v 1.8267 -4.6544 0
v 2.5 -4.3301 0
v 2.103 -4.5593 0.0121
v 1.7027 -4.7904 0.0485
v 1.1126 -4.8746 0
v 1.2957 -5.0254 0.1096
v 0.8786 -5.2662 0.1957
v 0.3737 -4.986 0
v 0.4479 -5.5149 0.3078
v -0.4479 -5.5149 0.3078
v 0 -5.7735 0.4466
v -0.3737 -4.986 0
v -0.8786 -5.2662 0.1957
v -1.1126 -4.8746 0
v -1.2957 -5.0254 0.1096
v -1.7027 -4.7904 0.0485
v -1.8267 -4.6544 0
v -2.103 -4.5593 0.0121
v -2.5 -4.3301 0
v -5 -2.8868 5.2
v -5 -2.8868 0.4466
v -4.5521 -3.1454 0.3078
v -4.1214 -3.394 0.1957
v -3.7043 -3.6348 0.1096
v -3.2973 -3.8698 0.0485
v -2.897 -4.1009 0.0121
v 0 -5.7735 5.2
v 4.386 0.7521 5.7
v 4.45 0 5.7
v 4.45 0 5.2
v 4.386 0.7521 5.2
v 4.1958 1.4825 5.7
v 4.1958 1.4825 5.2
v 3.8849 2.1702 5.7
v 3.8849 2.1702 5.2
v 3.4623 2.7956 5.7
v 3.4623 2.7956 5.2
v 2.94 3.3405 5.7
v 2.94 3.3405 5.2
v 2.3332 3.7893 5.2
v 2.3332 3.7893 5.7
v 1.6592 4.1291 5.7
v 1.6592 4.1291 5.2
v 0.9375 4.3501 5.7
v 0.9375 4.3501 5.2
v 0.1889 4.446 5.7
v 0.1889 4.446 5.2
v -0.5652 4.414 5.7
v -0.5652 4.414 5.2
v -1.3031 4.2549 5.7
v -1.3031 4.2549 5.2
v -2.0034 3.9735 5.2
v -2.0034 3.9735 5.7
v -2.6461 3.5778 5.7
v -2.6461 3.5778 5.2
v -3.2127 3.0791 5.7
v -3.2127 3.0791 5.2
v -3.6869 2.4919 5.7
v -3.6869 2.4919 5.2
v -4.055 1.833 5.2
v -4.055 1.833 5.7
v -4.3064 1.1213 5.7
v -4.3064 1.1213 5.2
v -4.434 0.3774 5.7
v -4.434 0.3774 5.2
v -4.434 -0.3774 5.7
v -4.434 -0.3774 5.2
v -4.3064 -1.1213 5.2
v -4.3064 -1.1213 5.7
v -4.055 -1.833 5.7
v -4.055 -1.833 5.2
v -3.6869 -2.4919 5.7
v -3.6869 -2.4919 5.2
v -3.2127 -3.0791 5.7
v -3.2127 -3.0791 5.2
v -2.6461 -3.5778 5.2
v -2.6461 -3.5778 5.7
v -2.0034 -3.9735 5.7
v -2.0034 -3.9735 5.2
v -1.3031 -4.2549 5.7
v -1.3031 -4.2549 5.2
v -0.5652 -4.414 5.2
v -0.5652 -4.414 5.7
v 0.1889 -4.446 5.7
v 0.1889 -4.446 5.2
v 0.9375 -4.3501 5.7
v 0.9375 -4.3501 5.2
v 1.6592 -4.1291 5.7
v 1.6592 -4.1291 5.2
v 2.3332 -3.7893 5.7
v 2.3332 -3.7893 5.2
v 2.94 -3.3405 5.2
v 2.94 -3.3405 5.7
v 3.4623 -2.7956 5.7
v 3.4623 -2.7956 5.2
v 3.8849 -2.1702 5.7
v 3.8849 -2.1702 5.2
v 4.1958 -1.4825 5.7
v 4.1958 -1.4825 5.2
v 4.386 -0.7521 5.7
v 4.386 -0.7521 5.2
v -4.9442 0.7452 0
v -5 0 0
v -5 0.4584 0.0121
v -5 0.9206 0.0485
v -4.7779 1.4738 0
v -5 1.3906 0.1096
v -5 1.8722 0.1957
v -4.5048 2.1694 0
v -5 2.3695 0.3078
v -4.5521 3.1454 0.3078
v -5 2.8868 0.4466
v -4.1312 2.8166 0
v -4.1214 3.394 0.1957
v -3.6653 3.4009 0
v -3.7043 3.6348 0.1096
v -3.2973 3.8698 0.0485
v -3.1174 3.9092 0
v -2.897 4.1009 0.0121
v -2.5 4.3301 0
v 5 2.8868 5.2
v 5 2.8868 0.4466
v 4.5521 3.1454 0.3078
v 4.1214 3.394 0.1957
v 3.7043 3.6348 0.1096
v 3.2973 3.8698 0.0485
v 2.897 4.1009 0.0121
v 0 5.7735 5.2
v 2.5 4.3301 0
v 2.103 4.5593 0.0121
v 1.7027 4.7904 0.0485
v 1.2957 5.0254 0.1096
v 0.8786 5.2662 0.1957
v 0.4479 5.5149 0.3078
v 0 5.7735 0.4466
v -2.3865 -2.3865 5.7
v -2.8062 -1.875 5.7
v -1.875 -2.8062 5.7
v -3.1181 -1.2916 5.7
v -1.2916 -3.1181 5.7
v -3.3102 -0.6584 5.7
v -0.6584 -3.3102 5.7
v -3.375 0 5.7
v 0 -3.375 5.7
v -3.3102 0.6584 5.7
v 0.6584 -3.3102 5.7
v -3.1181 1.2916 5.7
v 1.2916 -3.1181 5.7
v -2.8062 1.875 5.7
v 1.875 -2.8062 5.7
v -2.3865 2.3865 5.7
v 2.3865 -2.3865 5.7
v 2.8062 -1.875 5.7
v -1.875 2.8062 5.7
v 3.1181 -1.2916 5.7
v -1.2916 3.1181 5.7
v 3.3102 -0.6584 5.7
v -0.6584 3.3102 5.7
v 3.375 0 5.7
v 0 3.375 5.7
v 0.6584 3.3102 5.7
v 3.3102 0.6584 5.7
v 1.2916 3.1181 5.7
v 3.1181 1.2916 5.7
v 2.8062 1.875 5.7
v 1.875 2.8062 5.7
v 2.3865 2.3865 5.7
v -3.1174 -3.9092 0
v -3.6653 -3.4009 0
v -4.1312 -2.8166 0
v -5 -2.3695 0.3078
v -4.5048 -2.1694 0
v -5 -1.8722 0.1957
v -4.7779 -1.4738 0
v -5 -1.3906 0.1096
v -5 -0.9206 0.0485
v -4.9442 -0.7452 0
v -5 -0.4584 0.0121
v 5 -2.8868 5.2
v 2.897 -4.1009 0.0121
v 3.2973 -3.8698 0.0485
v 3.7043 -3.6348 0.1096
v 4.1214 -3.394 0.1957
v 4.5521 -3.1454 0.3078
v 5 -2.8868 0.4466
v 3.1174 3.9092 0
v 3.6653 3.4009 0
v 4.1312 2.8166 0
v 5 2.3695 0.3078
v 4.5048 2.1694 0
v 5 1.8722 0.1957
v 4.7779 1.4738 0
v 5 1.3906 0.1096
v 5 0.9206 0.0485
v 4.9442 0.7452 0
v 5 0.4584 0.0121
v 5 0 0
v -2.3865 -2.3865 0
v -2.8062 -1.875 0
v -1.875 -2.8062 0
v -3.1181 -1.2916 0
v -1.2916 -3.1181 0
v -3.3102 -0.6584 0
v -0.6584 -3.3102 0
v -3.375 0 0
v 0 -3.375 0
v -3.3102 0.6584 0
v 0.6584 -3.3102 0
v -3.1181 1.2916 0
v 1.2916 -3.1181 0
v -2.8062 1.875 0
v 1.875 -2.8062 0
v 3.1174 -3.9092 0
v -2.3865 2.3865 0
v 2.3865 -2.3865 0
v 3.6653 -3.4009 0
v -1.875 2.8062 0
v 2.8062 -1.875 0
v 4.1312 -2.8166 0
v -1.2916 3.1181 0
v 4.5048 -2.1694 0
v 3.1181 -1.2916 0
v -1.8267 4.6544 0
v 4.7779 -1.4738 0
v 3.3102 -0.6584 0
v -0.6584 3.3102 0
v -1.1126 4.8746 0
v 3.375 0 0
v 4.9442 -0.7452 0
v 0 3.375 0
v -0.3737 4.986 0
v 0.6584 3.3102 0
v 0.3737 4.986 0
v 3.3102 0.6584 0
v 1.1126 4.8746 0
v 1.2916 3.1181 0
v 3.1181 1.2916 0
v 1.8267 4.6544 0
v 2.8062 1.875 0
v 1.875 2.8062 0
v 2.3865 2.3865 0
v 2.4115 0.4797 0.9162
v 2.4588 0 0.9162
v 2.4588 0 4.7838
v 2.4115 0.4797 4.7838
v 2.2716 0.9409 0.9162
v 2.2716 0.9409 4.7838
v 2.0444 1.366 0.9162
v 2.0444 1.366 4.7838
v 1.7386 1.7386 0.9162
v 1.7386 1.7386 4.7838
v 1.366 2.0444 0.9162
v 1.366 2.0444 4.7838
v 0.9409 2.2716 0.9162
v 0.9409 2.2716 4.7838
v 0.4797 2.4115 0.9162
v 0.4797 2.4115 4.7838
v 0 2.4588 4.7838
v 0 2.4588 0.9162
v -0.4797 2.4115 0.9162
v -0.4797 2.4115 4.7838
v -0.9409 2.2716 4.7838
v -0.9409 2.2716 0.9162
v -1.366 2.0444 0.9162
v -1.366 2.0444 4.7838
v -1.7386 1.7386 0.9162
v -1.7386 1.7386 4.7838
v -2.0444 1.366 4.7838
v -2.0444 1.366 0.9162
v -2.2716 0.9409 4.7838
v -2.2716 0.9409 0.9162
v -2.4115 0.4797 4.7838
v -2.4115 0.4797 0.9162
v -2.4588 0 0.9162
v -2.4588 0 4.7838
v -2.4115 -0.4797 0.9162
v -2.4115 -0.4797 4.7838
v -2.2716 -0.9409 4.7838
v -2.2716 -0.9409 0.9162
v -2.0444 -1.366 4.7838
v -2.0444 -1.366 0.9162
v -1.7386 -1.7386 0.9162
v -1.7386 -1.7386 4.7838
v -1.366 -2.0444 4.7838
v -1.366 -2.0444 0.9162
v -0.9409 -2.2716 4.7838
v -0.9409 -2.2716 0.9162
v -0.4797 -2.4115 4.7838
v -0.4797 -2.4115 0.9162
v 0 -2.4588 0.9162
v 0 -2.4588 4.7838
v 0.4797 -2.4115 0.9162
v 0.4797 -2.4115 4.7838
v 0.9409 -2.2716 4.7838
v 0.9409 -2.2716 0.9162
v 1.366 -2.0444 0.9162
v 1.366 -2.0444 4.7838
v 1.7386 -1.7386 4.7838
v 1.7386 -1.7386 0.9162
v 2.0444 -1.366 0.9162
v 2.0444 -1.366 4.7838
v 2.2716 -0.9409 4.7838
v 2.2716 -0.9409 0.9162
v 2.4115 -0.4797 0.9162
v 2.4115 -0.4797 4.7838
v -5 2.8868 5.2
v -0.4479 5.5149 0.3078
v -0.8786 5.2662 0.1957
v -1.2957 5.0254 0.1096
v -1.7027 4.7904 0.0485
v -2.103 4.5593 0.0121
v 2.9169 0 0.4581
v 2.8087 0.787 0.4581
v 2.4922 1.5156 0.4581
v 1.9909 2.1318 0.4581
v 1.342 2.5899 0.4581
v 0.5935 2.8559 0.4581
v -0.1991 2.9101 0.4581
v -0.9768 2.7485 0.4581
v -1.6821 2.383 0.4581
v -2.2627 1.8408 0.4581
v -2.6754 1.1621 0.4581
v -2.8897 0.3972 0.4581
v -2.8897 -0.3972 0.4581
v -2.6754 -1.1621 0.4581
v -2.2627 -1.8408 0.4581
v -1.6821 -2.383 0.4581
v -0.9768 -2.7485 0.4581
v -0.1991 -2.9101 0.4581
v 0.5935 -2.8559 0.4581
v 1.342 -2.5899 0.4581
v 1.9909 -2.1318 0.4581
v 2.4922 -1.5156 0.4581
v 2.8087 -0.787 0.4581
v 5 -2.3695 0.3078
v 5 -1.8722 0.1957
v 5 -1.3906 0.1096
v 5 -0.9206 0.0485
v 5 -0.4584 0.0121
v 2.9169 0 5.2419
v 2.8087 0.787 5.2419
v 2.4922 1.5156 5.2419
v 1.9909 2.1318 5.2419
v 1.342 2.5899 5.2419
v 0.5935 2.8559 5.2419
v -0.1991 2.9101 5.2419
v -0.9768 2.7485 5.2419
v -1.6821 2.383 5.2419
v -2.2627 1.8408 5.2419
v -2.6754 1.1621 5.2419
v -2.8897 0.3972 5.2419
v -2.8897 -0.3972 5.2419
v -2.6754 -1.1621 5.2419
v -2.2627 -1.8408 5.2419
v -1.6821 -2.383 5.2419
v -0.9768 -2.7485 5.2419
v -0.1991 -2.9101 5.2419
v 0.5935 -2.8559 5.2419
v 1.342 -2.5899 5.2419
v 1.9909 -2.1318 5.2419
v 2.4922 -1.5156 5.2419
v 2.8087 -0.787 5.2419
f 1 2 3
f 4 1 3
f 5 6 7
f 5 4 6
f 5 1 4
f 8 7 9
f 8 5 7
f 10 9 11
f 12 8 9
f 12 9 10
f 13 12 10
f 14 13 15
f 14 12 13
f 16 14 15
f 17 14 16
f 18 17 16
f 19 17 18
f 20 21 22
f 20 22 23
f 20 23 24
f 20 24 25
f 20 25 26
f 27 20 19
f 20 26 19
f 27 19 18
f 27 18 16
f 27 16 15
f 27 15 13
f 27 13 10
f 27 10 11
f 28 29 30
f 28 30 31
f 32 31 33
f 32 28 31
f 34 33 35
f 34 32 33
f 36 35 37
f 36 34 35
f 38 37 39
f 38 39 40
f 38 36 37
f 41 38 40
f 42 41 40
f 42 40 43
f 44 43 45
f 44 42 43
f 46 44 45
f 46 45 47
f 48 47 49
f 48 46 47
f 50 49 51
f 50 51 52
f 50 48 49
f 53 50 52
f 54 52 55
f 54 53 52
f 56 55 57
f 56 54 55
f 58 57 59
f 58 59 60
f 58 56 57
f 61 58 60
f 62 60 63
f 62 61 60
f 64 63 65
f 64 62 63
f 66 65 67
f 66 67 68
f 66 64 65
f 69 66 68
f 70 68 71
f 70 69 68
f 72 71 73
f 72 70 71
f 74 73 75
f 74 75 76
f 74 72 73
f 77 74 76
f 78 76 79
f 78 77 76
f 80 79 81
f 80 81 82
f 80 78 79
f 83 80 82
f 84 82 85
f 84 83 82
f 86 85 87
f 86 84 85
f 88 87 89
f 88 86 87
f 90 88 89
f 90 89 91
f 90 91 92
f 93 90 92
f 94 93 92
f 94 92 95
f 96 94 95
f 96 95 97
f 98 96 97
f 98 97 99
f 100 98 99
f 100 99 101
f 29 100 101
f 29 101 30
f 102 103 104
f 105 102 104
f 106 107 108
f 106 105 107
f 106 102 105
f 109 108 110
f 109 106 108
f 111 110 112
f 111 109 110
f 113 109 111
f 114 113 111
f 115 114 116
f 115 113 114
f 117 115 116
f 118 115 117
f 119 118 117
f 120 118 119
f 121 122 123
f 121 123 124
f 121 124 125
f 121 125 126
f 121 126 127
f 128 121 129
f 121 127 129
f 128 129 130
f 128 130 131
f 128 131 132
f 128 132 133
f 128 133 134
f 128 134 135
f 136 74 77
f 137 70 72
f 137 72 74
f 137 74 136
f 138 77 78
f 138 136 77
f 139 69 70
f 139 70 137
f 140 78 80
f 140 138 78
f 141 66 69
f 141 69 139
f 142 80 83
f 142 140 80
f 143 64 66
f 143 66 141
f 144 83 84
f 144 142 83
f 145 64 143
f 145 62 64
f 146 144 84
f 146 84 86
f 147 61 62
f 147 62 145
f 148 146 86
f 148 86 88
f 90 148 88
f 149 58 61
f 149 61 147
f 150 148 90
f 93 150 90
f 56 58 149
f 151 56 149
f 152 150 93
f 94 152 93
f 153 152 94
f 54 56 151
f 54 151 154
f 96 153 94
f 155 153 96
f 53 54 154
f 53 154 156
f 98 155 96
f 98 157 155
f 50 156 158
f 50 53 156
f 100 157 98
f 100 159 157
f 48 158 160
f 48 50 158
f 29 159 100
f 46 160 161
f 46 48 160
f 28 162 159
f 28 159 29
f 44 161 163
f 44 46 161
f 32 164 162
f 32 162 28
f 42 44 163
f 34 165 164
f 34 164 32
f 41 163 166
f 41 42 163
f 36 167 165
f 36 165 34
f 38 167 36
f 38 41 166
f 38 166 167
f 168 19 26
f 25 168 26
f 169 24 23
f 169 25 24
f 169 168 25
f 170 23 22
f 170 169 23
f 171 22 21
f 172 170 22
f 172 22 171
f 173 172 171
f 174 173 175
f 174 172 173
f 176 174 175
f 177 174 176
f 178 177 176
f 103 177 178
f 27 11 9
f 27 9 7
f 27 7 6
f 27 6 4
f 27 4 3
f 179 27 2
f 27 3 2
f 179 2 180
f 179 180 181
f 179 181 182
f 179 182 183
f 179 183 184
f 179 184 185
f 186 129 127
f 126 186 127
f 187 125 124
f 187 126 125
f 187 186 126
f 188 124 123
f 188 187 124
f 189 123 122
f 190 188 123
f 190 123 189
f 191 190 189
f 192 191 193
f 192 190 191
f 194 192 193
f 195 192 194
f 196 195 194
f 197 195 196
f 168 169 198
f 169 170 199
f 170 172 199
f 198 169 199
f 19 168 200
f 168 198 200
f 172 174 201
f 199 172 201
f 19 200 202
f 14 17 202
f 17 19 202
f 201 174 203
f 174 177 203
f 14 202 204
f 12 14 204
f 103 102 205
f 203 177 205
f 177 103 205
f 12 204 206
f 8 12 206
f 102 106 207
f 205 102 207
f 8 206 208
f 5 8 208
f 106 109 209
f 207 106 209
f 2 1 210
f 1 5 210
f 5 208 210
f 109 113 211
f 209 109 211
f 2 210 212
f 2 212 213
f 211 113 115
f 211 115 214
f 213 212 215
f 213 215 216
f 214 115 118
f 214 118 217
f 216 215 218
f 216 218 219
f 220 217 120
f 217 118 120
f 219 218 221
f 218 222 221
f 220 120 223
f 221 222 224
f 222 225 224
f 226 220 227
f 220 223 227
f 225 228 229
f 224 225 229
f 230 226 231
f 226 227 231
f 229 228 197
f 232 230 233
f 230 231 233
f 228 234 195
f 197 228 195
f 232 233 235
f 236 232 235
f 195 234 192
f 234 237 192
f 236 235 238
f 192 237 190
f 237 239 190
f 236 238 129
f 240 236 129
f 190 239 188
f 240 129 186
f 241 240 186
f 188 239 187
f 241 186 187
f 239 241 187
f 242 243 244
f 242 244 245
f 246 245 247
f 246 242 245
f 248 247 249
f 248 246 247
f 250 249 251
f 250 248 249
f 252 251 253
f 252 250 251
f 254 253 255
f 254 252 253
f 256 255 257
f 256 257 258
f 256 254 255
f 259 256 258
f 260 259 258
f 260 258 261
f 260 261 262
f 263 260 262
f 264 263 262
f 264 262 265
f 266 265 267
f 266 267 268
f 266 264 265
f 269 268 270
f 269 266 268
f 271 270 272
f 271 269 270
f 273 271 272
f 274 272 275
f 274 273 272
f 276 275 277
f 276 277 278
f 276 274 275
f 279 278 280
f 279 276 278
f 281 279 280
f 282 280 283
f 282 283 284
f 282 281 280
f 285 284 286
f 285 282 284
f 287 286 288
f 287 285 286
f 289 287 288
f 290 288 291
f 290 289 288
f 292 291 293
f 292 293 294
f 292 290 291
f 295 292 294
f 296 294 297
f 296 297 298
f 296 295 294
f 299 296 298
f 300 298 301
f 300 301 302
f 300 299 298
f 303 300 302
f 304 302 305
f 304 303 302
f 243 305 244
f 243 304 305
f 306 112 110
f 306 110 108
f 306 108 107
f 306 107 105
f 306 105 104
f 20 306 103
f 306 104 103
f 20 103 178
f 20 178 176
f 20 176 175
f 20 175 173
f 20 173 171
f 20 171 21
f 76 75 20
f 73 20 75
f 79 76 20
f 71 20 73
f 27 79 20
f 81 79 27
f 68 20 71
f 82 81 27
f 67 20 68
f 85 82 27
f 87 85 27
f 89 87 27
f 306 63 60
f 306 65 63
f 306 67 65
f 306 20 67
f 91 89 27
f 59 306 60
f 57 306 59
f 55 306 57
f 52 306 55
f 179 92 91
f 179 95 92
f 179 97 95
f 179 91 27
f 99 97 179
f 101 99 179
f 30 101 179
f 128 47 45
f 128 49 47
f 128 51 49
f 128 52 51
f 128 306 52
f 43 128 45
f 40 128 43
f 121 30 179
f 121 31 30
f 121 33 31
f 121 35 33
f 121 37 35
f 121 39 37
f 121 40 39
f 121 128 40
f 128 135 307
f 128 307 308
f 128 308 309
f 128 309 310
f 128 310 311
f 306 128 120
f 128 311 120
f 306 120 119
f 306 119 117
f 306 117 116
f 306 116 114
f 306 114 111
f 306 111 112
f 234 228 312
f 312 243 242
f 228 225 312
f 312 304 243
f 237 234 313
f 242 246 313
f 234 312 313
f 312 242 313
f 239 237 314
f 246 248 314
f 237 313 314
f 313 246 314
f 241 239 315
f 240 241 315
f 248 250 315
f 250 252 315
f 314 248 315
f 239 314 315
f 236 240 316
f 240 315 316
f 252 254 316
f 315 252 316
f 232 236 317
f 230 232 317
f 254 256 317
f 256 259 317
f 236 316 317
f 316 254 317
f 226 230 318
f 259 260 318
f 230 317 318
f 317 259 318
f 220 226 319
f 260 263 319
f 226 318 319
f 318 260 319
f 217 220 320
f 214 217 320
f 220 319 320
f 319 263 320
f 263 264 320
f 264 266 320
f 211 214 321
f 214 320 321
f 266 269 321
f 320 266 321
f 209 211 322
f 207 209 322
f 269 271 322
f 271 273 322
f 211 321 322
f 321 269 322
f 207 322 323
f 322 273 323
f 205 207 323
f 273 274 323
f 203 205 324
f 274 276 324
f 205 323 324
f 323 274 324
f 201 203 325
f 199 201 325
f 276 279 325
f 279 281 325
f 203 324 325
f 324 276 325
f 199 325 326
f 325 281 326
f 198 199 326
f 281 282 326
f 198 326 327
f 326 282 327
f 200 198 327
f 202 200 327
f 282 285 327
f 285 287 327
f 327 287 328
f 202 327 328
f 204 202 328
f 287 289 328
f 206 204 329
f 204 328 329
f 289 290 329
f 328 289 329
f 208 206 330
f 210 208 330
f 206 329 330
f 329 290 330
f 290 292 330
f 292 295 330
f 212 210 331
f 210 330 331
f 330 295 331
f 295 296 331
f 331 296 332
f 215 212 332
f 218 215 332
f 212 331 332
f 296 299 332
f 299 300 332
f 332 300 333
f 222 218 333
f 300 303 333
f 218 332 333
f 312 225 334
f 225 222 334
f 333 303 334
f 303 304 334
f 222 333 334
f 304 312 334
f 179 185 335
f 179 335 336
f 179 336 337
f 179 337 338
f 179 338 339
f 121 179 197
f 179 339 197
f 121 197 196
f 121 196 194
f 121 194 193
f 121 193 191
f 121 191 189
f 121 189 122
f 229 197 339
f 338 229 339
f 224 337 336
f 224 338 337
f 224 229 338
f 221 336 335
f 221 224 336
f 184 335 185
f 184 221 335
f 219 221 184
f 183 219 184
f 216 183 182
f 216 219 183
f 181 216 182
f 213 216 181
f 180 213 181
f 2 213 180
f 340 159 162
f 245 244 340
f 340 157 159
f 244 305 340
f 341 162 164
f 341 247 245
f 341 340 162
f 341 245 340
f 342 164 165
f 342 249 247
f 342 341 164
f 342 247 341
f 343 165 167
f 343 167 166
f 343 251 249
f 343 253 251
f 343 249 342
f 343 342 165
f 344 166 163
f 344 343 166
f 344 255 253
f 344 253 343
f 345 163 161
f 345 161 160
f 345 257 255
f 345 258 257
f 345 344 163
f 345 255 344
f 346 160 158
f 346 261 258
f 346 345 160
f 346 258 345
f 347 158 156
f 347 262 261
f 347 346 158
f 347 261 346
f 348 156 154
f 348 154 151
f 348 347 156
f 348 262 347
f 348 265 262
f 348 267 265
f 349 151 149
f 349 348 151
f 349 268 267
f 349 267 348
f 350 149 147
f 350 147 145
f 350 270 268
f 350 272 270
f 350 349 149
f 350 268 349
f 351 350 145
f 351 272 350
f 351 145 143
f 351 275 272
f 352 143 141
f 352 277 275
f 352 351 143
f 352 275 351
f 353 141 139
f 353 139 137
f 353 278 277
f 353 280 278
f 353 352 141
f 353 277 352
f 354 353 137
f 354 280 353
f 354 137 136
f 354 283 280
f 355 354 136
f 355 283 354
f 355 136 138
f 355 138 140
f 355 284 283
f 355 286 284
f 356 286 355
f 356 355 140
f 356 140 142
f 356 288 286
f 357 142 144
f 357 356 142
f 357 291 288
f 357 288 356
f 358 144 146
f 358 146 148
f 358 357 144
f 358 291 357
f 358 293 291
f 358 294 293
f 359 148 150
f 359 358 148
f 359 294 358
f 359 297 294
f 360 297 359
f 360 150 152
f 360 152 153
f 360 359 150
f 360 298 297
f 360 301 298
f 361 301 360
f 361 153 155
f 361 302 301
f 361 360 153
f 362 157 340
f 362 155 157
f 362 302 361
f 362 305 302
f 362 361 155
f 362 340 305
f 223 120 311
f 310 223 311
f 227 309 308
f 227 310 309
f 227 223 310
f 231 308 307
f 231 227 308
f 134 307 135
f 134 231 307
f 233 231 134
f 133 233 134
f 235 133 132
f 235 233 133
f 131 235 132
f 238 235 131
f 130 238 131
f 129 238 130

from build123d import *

# Parameters (mm, degrees)
SKETCH_1_R          = 2.45875
EXTRUDE_640_DEPTH   = 5.7
SKETCH_2_OUTSIDE_W  = 51.738
SKETCH_2_OUTSIDE_H  = 53.286
SKETCH_2_OUTSIDE_R  = 5
CUT_EXTRUDE_1_DEPTH = 10.530127666
CUT_EXTRUDE_1_DRAFT = -60
CHAMFER_1_SIZE      = 0.91625
SKETCH_3_OUTSIDE_W  = 51.738
SKETCH_3_OUTSIDE_H  = 53.286
SKETCH_3_OUTSIDE_R  = 5
CUT_EXTRUDE_2_DEPTH = 10.530127666
CUT_EXTRUDE_2_DRAFT = -60
SKETCH_4_R          = 8.9
SKETCH_4_R_2        = 4.45
CUT_EXTRUDE_3_DEPTH = 0.5


with BuildPart() as part:
    # 草图1 → Extrude 640 (new body)
    with BuildSketch(Plane.XY):
        Polygon((0, 5.773502692), (-5, 2.886751346), (-5, -2.886751346), (0, -5.773502692), (5, -2.886751346), (5, 2.886751346), align=None)
        Circle(SKETCH_1_R, mode=Mode.SUBTRACT)
    extrude(amount=EXTRUDE_640_DEPTH)


with BuildPart() as cut_extrude_1_tool:
    # 草图2 outside → 切除-拉伸1 (with draft: the straight prism first)
    with BuildSketch(Plane(origin=(0, 0, 0), x_dir=(-1, 0, 0), z_dir=(0, 0, -1))):
        Rectangle(SKETCH_2_OUTSIDE_W, SKETCH_2_OUTSIDE_H)
        Circle(SKETCH_2_OUTSIDE_R, mode=Mode.SUBTRACT)
    extrude(amount=-CUT_EXTRUDE_1_DEPTH)
    # 切除-拉伸1: the draft: its side faces are tilted about the plane it starts from
    cut_extrude_1_sides = [cut_extrude_1_tool.faces().sort_by_distance(p)[0] for p in [
        (0, -26.643, 5.265063833),
        (-25.869, 0, 5.265063833),
        (0, 26.643, 5.265063833),
        (25.869, 0, 5.265063833),
        (5, 0, 5.265063833),
    ]]
    draft(cut_extrude_1_sides, Plane(origin=(0, 0, 0), x_dir=(-1, 0, 0), z_dir=(0, 0, -1)), CUT_EXTRUDE_1_DRAFT)


with BuildPart() as part_1:
    add(part.part)

    # 切除-拉伸1: cut by cut_extrude_1_tool
    add(cut_extrude_1_tool.part, mode=Mode.SUBTRACT)

    # 倒角1
    chamfer_1_edges = [part_1.edges().sort_by_distance(p)[0] for p in [
        (-2.45875, 0, 0),
        (-2.45875, 0, 5.7),
    ]]
    chamfer(chamfer_1_edges, length=CHAMFER_1_SIZE)


with BuildPart() as cut_extrude_2_tool:
    # 草图3 outside → 切除-拉伸2 (with draft: the straight prism first)
    with BuildSketch(Plane.XY.offset(5.7)):
        Rectangle(SKETCH_3_OUTSIDE_W, SKETCH_3_OUTSIDE_H)
        Circle(SKETCH_3_OUTSIDE_R, mode=Mode.SUBTRACT)
    extrude(amount=-CUT_EXTRUDE_2_DEPTH)
    # 切除-拉伸2: the draft: its side faces are tilted about the plane it starts from
    cut_extrude_2_sides = [cut_extrude_2_tool.faces().sort_by_distance(p)[0] for p in [
        (0, -26.643, 0.434936167),
        (25.869, 0, 0.434936167),
        (0, 26.643, 0.434936167),
        (-25.869, 0, 0.434936167),
        (-5, 0, 0.434936167),
    ]]
    draft(cut_extrude_2_sides, Plane.XY.offset(5.7), CUT_EXTRUDE_2_DRAFT)


with BuildPart() as part_2:
    add(part_1.part)

    # 切除-拉伸2: cut by cut_extrude_2_tool
    add(cut_extrude_2_tool.part, mode=Mode.SUBTRACT)

    # 草图4 → 切除-拉伸3 (cut)
    with BuildSketch(Plane.XY.offset(5.7)):
        Circle(SKETCH_4_R)
        Circle(SKETCH_4_R_2, mode=Mode.SUBTRACT)
    extrude(amount=-CUT_EXTRUDE_3_DEPTH, mode=Mode.SUBTRACT)


solid = part_2.part
